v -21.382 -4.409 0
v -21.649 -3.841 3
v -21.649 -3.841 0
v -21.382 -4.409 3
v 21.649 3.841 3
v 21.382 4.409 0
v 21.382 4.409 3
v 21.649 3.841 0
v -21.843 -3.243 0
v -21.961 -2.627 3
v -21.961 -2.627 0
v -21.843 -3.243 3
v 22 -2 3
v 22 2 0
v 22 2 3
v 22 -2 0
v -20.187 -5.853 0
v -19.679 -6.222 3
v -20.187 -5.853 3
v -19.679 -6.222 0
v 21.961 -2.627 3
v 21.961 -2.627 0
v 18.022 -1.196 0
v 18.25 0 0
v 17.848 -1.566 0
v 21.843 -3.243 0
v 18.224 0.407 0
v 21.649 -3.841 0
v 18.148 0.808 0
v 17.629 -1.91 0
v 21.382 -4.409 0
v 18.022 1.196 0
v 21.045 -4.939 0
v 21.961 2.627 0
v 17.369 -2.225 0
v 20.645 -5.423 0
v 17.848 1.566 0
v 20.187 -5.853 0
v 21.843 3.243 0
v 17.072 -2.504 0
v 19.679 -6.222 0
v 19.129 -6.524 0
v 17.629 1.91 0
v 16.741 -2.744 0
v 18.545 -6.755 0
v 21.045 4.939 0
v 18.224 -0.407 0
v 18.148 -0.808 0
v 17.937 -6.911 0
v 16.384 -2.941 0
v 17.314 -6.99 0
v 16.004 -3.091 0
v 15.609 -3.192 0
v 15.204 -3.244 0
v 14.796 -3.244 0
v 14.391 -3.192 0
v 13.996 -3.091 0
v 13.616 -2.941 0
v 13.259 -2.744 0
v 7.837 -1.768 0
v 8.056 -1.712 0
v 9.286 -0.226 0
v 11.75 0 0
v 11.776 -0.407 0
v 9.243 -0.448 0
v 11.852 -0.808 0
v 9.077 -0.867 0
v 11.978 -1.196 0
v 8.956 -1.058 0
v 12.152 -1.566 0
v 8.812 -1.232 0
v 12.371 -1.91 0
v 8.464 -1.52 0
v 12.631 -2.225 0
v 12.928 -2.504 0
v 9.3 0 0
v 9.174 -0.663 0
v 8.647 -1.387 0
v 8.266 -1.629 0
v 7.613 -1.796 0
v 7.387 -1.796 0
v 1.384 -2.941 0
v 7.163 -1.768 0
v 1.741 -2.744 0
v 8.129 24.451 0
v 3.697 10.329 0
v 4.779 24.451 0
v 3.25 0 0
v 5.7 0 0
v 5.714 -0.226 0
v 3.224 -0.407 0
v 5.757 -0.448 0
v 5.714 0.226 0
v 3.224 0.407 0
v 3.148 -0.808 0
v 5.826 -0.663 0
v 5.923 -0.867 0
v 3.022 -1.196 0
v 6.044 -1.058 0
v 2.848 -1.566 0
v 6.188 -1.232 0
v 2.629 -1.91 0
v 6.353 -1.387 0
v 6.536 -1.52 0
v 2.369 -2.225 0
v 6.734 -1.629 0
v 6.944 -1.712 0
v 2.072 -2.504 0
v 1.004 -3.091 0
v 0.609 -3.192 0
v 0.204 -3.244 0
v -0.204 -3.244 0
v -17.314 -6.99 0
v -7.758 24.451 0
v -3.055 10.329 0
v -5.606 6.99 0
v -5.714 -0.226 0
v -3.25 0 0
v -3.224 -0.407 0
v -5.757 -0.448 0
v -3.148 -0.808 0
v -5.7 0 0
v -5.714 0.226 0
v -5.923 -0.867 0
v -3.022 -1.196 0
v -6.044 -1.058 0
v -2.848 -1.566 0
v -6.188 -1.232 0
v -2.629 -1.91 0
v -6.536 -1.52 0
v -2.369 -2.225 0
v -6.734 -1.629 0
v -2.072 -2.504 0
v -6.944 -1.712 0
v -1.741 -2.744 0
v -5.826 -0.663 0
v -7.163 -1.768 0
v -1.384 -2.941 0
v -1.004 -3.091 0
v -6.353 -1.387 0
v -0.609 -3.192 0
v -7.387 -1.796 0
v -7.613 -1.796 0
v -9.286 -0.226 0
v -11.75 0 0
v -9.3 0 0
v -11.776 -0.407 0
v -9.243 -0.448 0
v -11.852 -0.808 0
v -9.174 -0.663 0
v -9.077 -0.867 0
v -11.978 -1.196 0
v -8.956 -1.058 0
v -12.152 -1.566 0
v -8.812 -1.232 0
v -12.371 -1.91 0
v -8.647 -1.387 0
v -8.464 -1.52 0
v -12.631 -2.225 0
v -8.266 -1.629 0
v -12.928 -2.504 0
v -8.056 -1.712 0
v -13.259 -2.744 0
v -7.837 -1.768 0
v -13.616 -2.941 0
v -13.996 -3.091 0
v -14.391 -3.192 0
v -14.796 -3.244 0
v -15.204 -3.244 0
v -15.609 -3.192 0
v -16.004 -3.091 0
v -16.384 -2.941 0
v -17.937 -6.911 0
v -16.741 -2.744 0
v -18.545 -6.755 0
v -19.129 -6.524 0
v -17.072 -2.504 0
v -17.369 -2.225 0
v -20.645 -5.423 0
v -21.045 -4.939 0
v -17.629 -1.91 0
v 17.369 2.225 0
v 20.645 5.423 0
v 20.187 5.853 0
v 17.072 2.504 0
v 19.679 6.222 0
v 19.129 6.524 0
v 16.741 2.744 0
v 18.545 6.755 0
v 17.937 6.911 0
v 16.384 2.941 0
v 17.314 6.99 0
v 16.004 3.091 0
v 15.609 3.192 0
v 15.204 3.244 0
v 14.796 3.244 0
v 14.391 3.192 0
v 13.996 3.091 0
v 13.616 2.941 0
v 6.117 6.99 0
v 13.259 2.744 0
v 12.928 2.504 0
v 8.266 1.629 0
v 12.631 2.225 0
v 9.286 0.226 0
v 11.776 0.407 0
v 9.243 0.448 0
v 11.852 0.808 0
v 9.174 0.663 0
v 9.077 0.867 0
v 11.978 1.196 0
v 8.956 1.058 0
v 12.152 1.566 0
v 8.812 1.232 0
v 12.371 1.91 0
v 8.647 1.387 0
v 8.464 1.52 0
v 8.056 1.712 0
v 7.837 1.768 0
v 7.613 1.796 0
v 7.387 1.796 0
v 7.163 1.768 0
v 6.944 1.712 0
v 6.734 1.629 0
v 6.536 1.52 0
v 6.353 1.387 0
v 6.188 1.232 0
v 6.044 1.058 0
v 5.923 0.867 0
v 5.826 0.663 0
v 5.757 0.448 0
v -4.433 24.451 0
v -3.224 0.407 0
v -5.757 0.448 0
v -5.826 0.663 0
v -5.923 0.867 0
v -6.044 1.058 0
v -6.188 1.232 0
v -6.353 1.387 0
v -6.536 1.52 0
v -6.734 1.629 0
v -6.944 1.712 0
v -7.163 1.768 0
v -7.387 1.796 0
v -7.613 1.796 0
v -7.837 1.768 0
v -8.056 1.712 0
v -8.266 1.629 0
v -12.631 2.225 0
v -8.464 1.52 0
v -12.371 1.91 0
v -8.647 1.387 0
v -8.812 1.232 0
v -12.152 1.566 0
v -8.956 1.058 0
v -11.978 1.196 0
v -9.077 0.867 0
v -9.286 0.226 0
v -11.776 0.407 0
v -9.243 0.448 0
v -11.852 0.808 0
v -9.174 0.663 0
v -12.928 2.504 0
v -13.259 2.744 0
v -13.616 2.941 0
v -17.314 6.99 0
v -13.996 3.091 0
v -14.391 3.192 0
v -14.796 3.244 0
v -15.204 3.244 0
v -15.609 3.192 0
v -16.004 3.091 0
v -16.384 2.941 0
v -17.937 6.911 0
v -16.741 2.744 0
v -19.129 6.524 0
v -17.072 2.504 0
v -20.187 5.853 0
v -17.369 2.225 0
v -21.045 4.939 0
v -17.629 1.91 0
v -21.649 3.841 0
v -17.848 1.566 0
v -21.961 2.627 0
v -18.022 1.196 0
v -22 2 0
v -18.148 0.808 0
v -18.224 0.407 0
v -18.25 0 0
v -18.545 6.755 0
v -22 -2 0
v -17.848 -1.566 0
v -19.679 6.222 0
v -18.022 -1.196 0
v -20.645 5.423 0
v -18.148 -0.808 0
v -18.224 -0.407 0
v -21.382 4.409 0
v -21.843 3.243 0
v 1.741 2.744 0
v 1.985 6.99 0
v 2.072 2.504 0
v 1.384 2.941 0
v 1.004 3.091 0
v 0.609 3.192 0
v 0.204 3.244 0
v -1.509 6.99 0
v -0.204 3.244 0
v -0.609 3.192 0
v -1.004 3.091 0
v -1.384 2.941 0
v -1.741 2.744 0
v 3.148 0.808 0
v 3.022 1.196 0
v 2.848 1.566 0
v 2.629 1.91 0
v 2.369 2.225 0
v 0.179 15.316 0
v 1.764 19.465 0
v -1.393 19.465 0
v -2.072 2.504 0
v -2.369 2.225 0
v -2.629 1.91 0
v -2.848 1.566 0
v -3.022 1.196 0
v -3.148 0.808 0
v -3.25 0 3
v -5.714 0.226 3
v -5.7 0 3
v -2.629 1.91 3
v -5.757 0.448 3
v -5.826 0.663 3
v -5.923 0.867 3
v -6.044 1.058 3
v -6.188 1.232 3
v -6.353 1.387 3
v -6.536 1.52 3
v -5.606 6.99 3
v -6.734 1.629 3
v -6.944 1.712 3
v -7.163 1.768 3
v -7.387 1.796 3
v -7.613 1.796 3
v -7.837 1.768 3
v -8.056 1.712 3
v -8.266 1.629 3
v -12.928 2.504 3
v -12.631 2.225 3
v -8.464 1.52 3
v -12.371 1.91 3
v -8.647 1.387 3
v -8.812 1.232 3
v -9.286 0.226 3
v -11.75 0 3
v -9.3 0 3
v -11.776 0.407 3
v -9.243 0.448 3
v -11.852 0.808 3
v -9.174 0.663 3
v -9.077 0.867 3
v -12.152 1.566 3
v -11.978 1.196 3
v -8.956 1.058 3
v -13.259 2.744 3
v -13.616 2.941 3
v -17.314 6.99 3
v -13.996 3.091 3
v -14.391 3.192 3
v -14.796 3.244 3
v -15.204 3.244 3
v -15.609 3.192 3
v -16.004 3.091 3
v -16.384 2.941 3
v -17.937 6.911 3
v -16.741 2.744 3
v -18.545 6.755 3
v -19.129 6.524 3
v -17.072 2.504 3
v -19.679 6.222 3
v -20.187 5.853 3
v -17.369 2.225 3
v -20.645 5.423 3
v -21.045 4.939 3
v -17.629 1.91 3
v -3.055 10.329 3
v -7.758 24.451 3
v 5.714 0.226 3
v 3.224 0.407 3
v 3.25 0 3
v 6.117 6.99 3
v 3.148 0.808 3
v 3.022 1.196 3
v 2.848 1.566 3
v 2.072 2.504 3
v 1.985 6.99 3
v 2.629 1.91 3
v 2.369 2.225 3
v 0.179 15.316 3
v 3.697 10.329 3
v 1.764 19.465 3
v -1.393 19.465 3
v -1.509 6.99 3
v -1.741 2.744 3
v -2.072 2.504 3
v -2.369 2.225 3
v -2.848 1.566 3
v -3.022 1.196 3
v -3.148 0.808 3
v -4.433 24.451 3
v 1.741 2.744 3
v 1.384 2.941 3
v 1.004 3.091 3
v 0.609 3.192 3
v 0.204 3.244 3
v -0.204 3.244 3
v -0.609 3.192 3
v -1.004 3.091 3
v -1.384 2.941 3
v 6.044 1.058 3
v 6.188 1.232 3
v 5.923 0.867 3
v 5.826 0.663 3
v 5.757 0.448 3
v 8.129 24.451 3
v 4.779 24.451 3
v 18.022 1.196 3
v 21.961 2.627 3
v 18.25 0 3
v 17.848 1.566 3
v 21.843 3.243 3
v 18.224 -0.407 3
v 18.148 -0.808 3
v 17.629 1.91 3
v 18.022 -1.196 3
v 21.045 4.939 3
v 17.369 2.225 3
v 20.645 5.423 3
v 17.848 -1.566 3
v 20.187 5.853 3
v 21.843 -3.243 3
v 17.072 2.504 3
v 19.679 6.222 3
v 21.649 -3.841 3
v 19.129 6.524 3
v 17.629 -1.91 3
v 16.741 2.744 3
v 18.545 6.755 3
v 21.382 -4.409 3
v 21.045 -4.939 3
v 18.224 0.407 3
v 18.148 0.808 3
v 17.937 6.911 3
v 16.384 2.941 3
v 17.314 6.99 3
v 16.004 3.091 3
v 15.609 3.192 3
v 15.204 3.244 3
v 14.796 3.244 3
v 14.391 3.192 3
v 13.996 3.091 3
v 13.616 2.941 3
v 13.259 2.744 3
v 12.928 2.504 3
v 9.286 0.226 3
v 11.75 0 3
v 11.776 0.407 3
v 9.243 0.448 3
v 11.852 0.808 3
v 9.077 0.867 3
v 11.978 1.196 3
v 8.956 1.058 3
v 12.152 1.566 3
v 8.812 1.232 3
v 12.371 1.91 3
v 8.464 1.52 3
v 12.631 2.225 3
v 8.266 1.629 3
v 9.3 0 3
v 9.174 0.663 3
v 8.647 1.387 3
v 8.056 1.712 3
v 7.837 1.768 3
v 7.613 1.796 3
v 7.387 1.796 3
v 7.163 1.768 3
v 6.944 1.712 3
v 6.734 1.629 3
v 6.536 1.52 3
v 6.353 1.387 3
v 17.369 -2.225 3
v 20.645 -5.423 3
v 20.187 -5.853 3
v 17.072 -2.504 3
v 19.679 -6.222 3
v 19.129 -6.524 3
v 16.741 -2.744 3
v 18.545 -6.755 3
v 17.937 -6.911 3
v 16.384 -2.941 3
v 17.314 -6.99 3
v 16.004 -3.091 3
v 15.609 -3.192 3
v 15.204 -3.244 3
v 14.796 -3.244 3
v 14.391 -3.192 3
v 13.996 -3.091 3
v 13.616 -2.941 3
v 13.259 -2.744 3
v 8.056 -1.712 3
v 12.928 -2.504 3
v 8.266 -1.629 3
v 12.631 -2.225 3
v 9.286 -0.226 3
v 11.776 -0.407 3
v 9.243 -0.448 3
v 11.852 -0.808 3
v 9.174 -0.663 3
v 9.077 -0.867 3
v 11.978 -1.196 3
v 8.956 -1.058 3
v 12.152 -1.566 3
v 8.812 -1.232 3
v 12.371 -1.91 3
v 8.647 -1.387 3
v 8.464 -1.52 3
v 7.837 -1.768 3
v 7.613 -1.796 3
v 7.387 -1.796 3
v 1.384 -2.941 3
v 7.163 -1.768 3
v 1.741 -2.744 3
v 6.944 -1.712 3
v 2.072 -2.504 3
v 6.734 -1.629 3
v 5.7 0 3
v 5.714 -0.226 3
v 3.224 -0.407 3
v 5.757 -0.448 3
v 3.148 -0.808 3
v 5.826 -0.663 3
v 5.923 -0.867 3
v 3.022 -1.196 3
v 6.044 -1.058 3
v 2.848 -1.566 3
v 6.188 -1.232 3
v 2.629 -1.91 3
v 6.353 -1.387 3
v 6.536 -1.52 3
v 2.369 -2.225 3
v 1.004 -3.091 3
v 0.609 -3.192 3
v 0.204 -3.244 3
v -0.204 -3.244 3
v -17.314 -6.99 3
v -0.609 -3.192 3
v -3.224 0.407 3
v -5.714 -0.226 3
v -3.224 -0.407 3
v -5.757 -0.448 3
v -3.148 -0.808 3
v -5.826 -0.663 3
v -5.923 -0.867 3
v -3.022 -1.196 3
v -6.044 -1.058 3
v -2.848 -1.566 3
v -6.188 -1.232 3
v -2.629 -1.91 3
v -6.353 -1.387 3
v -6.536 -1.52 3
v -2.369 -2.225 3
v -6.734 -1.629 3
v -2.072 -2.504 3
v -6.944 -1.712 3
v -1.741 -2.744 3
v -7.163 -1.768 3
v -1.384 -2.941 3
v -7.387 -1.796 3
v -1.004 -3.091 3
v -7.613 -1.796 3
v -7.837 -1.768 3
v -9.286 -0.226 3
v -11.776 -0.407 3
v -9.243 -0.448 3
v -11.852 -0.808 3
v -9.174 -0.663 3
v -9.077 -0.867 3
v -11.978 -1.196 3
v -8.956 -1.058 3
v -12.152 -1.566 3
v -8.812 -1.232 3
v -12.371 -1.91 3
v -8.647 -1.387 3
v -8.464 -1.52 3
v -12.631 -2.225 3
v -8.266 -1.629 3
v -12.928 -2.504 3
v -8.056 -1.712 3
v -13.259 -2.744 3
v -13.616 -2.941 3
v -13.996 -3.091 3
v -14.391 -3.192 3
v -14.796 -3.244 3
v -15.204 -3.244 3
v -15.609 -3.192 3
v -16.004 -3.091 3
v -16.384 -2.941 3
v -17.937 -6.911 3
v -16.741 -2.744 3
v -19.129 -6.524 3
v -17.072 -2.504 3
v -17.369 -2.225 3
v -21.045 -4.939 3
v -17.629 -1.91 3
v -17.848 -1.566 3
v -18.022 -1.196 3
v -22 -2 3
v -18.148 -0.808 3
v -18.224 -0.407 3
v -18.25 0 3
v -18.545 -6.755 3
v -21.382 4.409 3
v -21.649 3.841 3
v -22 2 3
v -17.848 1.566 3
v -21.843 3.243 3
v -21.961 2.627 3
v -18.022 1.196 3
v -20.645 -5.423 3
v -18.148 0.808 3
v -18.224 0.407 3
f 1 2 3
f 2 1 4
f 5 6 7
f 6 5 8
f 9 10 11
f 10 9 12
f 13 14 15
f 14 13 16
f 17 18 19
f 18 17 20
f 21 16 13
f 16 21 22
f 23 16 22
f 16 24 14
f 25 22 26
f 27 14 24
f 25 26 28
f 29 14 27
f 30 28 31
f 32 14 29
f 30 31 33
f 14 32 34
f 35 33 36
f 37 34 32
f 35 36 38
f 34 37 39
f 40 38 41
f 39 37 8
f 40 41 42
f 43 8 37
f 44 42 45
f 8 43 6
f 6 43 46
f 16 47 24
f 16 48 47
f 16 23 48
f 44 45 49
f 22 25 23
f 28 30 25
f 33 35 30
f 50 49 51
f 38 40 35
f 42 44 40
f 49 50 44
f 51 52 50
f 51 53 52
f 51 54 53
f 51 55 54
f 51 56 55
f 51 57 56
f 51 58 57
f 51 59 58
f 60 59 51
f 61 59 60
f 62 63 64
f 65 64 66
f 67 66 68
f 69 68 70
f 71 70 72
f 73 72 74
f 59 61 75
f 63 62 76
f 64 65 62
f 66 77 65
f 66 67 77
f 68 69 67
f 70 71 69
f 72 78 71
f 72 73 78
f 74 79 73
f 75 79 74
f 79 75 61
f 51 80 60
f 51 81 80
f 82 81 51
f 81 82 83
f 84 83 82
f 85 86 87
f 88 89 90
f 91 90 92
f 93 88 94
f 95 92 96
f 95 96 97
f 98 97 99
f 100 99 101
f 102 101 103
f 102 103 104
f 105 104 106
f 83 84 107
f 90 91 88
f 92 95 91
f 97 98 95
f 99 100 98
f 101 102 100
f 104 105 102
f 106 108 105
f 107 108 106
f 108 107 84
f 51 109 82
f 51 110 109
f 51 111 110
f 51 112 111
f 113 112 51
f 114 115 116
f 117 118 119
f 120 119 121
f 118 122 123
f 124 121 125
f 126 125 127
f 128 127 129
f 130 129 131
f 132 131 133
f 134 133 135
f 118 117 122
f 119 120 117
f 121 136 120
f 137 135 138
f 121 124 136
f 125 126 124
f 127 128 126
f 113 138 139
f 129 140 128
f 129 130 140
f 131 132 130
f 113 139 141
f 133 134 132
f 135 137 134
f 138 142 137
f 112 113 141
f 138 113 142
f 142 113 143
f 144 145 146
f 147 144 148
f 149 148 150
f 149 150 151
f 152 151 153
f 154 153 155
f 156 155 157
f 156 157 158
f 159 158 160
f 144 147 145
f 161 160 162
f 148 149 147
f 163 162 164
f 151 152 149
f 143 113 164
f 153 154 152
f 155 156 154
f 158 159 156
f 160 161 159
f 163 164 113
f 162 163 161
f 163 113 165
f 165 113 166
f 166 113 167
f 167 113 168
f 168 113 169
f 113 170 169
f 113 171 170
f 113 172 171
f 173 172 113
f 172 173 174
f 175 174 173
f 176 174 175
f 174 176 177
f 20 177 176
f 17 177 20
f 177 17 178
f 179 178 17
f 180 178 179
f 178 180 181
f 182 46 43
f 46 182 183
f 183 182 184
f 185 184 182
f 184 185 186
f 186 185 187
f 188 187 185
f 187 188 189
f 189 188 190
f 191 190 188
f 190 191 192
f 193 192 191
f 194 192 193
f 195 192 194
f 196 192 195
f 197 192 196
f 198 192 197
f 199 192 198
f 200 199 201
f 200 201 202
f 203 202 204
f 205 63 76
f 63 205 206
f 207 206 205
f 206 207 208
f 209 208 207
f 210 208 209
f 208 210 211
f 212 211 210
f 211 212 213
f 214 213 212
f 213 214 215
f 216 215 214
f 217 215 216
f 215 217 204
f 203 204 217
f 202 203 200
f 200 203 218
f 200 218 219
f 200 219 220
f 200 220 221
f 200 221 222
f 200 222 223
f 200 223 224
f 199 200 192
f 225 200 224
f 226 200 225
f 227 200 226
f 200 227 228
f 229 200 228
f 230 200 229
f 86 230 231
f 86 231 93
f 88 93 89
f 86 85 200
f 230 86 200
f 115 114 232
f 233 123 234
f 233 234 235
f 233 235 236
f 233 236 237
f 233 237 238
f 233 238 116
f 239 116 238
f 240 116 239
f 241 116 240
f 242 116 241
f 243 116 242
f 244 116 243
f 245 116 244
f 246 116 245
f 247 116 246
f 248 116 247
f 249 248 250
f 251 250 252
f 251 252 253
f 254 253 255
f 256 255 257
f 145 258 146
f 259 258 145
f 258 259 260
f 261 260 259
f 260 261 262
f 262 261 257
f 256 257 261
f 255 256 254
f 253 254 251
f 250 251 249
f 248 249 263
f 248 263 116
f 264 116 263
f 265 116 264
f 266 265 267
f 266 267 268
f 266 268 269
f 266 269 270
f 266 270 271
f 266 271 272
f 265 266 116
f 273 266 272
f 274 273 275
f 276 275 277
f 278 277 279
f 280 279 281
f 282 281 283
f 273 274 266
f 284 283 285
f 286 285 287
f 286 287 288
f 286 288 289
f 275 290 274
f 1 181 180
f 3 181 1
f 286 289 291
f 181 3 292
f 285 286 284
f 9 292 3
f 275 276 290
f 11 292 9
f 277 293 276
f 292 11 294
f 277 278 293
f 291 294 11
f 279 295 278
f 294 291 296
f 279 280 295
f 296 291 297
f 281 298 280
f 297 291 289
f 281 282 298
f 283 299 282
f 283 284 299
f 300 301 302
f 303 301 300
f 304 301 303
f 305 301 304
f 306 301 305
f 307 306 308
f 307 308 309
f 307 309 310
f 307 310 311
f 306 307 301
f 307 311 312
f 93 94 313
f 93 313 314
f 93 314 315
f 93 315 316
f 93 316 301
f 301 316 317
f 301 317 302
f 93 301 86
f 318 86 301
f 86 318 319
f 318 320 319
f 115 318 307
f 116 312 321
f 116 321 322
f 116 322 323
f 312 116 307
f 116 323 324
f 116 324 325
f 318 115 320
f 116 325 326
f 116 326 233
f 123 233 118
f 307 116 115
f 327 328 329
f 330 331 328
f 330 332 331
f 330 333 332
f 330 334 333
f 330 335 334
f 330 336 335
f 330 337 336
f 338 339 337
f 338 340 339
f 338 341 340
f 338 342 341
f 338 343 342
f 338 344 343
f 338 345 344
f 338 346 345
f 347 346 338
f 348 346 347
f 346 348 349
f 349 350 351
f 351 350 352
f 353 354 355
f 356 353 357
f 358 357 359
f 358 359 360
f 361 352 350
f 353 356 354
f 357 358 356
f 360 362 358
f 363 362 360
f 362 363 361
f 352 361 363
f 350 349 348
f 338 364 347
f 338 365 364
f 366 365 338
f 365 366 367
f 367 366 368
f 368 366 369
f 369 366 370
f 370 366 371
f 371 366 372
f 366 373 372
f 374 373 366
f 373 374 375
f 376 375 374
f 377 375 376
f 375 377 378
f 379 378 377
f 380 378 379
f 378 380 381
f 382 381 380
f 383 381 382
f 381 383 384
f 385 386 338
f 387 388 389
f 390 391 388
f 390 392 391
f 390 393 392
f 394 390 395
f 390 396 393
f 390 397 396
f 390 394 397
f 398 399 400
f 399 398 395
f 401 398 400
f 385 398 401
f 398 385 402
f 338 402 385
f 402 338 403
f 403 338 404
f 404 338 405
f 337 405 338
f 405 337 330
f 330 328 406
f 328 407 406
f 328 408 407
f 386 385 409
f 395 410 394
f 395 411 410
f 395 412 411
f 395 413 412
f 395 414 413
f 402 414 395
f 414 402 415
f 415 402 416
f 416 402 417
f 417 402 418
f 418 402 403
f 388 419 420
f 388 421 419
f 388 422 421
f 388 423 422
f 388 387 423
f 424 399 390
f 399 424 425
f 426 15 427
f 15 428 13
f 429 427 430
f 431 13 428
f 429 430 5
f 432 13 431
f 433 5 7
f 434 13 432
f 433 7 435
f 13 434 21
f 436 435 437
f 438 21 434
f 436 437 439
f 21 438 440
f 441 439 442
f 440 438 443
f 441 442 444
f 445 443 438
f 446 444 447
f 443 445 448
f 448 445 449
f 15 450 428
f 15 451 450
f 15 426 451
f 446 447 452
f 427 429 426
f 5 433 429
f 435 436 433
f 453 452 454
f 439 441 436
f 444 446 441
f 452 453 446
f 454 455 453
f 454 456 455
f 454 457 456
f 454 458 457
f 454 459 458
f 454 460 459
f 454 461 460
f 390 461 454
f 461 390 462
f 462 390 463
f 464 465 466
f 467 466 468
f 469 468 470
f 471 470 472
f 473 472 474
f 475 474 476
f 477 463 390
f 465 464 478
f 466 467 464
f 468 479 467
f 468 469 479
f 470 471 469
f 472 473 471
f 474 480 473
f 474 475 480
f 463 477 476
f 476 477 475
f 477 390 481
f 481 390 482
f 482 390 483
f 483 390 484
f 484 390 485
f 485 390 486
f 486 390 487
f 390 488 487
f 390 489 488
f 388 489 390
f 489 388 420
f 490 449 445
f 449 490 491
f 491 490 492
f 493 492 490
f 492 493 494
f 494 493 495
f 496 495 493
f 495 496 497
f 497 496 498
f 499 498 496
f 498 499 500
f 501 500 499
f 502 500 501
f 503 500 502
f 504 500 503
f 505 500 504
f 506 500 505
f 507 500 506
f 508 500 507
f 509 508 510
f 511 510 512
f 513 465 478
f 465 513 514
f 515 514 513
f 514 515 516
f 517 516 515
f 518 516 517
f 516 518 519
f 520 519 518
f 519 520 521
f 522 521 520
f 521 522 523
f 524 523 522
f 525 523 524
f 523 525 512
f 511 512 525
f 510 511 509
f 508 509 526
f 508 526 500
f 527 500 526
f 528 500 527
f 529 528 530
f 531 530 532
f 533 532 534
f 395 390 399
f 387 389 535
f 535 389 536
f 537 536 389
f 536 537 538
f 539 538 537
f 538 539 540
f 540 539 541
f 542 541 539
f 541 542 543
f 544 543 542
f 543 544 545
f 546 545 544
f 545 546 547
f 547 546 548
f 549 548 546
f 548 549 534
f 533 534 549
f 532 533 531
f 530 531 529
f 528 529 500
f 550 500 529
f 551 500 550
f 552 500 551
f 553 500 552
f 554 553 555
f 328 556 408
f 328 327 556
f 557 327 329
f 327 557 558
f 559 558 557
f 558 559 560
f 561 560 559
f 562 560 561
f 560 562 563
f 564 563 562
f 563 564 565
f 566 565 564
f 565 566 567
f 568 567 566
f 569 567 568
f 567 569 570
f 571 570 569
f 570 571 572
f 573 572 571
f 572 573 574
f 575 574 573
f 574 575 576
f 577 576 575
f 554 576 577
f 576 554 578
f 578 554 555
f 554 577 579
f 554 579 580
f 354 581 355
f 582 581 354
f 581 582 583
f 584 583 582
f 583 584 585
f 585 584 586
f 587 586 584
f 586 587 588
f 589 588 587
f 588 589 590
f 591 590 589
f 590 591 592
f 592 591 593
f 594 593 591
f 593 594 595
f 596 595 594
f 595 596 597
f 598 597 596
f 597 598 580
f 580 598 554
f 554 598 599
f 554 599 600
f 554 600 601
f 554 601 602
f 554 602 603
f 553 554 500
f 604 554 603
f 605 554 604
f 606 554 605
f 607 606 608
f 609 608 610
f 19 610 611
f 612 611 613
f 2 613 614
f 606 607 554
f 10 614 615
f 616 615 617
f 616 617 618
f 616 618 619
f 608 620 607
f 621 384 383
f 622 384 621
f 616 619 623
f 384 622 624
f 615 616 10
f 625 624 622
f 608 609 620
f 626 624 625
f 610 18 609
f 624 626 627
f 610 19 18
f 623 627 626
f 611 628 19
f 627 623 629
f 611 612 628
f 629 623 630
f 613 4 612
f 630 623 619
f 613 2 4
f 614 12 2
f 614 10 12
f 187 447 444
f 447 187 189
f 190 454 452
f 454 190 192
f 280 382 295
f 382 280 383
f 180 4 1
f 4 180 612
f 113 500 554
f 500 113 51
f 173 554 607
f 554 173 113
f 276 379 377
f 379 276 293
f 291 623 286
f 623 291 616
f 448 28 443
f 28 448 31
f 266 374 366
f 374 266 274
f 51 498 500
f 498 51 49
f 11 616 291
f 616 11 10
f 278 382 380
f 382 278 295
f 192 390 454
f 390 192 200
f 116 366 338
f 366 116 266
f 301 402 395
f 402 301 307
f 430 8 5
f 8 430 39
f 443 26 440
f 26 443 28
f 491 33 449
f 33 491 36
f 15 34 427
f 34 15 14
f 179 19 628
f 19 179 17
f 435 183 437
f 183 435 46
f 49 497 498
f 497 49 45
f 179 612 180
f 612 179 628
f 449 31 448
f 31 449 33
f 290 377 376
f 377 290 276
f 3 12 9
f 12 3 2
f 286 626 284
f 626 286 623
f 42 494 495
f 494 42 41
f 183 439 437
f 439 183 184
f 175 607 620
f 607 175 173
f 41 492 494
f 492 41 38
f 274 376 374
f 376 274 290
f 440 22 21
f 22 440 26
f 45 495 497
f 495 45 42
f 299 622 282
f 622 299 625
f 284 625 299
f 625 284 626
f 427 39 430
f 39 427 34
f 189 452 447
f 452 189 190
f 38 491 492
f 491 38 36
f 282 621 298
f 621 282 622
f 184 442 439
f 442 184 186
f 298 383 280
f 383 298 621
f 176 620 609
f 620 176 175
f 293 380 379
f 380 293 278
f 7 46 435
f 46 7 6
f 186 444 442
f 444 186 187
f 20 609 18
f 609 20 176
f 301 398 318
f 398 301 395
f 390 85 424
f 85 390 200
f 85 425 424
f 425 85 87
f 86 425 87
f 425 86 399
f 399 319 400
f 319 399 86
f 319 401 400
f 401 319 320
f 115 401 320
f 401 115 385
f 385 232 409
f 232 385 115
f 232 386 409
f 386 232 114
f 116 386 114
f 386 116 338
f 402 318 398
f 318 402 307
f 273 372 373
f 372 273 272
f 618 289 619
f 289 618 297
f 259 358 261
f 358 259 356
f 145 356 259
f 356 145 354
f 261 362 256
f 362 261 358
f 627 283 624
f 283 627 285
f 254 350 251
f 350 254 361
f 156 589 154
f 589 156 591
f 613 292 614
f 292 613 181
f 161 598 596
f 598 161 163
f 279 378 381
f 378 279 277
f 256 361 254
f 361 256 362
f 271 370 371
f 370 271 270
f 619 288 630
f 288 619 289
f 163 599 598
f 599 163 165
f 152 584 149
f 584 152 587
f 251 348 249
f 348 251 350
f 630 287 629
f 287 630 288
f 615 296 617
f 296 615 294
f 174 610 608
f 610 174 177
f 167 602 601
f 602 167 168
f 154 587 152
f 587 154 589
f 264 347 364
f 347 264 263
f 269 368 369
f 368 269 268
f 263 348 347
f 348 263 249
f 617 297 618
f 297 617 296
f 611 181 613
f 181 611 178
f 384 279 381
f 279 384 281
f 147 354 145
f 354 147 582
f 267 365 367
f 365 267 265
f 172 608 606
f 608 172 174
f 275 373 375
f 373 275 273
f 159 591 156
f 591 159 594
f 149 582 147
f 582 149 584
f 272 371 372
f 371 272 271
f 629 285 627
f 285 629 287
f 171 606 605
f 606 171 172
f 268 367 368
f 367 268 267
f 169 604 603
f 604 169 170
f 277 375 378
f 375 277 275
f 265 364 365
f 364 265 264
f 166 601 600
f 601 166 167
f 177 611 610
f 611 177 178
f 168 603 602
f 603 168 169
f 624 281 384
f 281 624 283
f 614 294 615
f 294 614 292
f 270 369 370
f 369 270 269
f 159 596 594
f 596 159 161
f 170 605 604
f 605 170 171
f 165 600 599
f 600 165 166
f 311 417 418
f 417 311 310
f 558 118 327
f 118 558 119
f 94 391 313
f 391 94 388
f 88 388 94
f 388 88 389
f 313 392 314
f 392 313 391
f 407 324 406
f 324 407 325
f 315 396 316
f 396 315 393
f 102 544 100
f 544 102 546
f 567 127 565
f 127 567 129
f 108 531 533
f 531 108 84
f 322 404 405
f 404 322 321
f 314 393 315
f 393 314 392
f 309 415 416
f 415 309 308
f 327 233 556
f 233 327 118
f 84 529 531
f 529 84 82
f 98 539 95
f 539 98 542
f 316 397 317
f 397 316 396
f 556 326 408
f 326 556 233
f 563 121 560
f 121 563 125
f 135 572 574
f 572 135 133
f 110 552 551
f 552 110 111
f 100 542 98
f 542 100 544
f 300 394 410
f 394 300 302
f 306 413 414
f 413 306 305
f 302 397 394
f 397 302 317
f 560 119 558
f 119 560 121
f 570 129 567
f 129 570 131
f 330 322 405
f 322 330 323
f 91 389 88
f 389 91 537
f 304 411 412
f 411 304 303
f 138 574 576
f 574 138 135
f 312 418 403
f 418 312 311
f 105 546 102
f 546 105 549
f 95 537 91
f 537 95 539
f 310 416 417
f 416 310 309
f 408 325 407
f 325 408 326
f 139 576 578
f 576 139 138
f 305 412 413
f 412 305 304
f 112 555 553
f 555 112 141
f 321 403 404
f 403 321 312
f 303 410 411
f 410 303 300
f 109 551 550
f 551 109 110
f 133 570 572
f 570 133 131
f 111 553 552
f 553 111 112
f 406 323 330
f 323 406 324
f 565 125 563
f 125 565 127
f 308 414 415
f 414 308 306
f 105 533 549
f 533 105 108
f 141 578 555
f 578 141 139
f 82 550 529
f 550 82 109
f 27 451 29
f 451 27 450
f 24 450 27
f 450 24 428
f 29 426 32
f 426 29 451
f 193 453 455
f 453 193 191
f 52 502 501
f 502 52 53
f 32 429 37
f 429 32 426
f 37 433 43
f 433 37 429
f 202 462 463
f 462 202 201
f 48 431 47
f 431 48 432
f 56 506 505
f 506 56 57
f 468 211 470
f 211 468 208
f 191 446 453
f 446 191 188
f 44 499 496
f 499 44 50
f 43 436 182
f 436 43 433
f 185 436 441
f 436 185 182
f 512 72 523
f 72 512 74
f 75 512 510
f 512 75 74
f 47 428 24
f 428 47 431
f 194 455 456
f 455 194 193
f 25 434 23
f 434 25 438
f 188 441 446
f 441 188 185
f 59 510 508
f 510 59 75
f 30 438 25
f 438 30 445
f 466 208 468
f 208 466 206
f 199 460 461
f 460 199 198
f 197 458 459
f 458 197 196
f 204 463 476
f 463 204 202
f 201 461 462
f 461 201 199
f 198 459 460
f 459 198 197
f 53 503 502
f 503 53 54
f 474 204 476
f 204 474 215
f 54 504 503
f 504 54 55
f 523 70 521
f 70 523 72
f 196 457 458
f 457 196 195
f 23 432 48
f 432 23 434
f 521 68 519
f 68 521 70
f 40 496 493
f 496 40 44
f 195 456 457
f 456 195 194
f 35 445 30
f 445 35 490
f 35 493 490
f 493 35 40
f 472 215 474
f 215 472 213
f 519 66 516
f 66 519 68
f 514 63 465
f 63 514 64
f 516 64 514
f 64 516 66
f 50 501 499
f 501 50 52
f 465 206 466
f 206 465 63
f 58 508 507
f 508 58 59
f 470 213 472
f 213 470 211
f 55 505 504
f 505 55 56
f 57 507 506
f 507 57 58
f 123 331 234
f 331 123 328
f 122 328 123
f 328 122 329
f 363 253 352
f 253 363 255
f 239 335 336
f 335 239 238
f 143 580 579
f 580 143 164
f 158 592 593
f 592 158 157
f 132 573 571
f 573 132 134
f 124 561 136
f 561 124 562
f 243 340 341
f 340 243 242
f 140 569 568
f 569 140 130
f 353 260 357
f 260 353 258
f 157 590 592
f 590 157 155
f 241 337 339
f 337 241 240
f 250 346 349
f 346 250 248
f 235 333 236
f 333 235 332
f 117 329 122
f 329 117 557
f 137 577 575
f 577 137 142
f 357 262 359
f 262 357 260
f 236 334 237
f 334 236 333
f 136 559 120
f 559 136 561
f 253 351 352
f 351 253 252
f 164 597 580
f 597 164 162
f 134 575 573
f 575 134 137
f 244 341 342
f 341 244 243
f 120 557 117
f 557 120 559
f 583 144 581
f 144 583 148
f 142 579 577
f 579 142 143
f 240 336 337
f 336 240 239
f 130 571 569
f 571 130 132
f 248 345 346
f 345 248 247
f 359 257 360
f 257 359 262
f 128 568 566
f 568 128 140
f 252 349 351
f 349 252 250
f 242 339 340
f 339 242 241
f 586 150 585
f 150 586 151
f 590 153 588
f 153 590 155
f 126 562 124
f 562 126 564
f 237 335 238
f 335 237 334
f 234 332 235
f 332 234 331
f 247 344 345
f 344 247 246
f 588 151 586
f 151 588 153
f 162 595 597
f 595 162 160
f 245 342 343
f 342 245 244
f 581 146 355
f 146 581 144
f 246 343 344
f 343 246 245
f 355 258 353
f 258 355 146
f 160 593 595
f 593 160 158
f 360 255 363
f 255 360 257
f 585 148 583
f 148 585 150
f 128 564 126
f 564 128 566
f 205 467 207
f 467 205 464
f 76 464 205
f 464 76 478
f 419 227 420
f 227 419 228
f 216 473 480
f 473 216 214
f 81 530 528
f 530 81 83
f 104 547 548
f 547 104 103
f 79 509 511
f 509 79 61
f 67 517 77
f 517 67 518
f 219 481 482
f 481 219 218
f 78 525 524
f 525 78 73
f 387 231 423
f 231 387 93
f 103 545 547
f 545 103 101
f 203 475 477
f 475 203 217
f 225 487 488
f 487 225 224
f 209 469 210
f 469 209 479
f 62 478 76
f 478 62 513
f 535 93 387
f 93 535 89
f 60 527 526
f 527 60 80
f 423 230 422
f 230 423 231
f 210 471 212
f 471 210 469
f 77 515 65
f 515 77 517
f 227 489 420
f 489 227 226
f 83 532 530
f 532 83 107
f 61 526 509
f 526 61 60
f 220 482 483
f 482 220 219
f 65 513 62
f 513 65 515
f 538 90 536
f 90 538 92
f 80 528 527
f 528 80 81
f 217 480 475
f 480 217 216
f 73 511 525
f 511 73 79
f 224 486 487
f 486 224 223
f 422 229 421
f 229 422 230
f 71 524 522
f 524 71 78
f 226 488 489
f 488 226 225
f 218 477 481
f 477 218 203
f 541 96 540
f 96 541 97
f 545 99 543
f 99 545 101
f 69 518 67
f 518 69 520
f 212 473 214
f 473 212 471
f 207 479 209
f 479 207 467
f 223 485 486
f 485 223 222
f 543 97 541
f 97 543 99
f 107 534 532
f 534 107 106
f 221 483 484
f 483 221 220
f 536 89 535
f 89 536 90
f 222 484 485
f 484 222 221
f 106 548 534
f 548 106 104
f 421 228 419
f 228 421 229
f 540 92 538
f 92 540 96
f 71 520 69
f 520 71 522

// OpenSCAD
$fn = 50;


difference() {
	union() {
		hull() {
			translate(v = [-17.0000000000, 2.0000000000, 0]) {
				cylinder(h = 3, r = 5);
			}
			translate(v = [17.0000000000, 2.0000000000, 0]) {
				cylinder(h = 3, r = 5);
			}
			translate(v = [-17.0000000000, -2.0000000000, 0]) {
				cylinder(h = 3, r = 5);
			}
			translate(v = [17.0000000000, -2.0000000000, 0]) {
				cylinder(h = 3, r = 5);
			}
		}
		translate(v = [0, 24, 0]) {
			linear_extrude(height = 3) {
				text(font = "DejaVu Sans Mono:style=Bold", halign = "center", size = 19.0000000000, text = "W", valign = "top");
			}
		}
	}
	union() {
		translate(v = [-15.0000000000, 0.0000000000, 0]) {
			translate(v = [0, 0, -100]) {
				cylinder(h = 200, r = 3.2500000000);
			}
		}
		translate(v = [0, 0, -100]) {
			cylinder(h = 200, r = 3.2500000000);
		}
		translate(v = [15.0000000000, 0.0000000000, 0]) {
			translate(v = [0, 0, -100]) {
				cylinder(h = 200, r = 3.2500000000);
			}
		}
		translate(v = [-15.0000000000, 0.0000000000, 0]) {
			translate(v = [0, 0, -100]) {
				cylinder(h = 200, r = 1.8000000000);
			}
		}
		translate(v = [-7.5000000000, 0.0000000000, 0]) {
			translate(v = [0, 0, -100]) {
				cylinder(h = 200, r = 1.8000000000);
			}
		}
		translate(v = [0, 0, -100]) {
			cylinder(h = 200, r = 1.8000000000);
		}
		translate(v = [7.5000000000, 0.0000000000, 0]) {
			translate(v = [0, 0, -100]) {
				cylinder(h = 200, r = 1.8000000000);
			}
		}
		translate(v = [15.0000000000, 0.0000000000, 0]) {
			translate(v = [0, 0, -100]) {
				cylinder(h = 200, r = 1.8000000000);
			}
		}
	}
}
